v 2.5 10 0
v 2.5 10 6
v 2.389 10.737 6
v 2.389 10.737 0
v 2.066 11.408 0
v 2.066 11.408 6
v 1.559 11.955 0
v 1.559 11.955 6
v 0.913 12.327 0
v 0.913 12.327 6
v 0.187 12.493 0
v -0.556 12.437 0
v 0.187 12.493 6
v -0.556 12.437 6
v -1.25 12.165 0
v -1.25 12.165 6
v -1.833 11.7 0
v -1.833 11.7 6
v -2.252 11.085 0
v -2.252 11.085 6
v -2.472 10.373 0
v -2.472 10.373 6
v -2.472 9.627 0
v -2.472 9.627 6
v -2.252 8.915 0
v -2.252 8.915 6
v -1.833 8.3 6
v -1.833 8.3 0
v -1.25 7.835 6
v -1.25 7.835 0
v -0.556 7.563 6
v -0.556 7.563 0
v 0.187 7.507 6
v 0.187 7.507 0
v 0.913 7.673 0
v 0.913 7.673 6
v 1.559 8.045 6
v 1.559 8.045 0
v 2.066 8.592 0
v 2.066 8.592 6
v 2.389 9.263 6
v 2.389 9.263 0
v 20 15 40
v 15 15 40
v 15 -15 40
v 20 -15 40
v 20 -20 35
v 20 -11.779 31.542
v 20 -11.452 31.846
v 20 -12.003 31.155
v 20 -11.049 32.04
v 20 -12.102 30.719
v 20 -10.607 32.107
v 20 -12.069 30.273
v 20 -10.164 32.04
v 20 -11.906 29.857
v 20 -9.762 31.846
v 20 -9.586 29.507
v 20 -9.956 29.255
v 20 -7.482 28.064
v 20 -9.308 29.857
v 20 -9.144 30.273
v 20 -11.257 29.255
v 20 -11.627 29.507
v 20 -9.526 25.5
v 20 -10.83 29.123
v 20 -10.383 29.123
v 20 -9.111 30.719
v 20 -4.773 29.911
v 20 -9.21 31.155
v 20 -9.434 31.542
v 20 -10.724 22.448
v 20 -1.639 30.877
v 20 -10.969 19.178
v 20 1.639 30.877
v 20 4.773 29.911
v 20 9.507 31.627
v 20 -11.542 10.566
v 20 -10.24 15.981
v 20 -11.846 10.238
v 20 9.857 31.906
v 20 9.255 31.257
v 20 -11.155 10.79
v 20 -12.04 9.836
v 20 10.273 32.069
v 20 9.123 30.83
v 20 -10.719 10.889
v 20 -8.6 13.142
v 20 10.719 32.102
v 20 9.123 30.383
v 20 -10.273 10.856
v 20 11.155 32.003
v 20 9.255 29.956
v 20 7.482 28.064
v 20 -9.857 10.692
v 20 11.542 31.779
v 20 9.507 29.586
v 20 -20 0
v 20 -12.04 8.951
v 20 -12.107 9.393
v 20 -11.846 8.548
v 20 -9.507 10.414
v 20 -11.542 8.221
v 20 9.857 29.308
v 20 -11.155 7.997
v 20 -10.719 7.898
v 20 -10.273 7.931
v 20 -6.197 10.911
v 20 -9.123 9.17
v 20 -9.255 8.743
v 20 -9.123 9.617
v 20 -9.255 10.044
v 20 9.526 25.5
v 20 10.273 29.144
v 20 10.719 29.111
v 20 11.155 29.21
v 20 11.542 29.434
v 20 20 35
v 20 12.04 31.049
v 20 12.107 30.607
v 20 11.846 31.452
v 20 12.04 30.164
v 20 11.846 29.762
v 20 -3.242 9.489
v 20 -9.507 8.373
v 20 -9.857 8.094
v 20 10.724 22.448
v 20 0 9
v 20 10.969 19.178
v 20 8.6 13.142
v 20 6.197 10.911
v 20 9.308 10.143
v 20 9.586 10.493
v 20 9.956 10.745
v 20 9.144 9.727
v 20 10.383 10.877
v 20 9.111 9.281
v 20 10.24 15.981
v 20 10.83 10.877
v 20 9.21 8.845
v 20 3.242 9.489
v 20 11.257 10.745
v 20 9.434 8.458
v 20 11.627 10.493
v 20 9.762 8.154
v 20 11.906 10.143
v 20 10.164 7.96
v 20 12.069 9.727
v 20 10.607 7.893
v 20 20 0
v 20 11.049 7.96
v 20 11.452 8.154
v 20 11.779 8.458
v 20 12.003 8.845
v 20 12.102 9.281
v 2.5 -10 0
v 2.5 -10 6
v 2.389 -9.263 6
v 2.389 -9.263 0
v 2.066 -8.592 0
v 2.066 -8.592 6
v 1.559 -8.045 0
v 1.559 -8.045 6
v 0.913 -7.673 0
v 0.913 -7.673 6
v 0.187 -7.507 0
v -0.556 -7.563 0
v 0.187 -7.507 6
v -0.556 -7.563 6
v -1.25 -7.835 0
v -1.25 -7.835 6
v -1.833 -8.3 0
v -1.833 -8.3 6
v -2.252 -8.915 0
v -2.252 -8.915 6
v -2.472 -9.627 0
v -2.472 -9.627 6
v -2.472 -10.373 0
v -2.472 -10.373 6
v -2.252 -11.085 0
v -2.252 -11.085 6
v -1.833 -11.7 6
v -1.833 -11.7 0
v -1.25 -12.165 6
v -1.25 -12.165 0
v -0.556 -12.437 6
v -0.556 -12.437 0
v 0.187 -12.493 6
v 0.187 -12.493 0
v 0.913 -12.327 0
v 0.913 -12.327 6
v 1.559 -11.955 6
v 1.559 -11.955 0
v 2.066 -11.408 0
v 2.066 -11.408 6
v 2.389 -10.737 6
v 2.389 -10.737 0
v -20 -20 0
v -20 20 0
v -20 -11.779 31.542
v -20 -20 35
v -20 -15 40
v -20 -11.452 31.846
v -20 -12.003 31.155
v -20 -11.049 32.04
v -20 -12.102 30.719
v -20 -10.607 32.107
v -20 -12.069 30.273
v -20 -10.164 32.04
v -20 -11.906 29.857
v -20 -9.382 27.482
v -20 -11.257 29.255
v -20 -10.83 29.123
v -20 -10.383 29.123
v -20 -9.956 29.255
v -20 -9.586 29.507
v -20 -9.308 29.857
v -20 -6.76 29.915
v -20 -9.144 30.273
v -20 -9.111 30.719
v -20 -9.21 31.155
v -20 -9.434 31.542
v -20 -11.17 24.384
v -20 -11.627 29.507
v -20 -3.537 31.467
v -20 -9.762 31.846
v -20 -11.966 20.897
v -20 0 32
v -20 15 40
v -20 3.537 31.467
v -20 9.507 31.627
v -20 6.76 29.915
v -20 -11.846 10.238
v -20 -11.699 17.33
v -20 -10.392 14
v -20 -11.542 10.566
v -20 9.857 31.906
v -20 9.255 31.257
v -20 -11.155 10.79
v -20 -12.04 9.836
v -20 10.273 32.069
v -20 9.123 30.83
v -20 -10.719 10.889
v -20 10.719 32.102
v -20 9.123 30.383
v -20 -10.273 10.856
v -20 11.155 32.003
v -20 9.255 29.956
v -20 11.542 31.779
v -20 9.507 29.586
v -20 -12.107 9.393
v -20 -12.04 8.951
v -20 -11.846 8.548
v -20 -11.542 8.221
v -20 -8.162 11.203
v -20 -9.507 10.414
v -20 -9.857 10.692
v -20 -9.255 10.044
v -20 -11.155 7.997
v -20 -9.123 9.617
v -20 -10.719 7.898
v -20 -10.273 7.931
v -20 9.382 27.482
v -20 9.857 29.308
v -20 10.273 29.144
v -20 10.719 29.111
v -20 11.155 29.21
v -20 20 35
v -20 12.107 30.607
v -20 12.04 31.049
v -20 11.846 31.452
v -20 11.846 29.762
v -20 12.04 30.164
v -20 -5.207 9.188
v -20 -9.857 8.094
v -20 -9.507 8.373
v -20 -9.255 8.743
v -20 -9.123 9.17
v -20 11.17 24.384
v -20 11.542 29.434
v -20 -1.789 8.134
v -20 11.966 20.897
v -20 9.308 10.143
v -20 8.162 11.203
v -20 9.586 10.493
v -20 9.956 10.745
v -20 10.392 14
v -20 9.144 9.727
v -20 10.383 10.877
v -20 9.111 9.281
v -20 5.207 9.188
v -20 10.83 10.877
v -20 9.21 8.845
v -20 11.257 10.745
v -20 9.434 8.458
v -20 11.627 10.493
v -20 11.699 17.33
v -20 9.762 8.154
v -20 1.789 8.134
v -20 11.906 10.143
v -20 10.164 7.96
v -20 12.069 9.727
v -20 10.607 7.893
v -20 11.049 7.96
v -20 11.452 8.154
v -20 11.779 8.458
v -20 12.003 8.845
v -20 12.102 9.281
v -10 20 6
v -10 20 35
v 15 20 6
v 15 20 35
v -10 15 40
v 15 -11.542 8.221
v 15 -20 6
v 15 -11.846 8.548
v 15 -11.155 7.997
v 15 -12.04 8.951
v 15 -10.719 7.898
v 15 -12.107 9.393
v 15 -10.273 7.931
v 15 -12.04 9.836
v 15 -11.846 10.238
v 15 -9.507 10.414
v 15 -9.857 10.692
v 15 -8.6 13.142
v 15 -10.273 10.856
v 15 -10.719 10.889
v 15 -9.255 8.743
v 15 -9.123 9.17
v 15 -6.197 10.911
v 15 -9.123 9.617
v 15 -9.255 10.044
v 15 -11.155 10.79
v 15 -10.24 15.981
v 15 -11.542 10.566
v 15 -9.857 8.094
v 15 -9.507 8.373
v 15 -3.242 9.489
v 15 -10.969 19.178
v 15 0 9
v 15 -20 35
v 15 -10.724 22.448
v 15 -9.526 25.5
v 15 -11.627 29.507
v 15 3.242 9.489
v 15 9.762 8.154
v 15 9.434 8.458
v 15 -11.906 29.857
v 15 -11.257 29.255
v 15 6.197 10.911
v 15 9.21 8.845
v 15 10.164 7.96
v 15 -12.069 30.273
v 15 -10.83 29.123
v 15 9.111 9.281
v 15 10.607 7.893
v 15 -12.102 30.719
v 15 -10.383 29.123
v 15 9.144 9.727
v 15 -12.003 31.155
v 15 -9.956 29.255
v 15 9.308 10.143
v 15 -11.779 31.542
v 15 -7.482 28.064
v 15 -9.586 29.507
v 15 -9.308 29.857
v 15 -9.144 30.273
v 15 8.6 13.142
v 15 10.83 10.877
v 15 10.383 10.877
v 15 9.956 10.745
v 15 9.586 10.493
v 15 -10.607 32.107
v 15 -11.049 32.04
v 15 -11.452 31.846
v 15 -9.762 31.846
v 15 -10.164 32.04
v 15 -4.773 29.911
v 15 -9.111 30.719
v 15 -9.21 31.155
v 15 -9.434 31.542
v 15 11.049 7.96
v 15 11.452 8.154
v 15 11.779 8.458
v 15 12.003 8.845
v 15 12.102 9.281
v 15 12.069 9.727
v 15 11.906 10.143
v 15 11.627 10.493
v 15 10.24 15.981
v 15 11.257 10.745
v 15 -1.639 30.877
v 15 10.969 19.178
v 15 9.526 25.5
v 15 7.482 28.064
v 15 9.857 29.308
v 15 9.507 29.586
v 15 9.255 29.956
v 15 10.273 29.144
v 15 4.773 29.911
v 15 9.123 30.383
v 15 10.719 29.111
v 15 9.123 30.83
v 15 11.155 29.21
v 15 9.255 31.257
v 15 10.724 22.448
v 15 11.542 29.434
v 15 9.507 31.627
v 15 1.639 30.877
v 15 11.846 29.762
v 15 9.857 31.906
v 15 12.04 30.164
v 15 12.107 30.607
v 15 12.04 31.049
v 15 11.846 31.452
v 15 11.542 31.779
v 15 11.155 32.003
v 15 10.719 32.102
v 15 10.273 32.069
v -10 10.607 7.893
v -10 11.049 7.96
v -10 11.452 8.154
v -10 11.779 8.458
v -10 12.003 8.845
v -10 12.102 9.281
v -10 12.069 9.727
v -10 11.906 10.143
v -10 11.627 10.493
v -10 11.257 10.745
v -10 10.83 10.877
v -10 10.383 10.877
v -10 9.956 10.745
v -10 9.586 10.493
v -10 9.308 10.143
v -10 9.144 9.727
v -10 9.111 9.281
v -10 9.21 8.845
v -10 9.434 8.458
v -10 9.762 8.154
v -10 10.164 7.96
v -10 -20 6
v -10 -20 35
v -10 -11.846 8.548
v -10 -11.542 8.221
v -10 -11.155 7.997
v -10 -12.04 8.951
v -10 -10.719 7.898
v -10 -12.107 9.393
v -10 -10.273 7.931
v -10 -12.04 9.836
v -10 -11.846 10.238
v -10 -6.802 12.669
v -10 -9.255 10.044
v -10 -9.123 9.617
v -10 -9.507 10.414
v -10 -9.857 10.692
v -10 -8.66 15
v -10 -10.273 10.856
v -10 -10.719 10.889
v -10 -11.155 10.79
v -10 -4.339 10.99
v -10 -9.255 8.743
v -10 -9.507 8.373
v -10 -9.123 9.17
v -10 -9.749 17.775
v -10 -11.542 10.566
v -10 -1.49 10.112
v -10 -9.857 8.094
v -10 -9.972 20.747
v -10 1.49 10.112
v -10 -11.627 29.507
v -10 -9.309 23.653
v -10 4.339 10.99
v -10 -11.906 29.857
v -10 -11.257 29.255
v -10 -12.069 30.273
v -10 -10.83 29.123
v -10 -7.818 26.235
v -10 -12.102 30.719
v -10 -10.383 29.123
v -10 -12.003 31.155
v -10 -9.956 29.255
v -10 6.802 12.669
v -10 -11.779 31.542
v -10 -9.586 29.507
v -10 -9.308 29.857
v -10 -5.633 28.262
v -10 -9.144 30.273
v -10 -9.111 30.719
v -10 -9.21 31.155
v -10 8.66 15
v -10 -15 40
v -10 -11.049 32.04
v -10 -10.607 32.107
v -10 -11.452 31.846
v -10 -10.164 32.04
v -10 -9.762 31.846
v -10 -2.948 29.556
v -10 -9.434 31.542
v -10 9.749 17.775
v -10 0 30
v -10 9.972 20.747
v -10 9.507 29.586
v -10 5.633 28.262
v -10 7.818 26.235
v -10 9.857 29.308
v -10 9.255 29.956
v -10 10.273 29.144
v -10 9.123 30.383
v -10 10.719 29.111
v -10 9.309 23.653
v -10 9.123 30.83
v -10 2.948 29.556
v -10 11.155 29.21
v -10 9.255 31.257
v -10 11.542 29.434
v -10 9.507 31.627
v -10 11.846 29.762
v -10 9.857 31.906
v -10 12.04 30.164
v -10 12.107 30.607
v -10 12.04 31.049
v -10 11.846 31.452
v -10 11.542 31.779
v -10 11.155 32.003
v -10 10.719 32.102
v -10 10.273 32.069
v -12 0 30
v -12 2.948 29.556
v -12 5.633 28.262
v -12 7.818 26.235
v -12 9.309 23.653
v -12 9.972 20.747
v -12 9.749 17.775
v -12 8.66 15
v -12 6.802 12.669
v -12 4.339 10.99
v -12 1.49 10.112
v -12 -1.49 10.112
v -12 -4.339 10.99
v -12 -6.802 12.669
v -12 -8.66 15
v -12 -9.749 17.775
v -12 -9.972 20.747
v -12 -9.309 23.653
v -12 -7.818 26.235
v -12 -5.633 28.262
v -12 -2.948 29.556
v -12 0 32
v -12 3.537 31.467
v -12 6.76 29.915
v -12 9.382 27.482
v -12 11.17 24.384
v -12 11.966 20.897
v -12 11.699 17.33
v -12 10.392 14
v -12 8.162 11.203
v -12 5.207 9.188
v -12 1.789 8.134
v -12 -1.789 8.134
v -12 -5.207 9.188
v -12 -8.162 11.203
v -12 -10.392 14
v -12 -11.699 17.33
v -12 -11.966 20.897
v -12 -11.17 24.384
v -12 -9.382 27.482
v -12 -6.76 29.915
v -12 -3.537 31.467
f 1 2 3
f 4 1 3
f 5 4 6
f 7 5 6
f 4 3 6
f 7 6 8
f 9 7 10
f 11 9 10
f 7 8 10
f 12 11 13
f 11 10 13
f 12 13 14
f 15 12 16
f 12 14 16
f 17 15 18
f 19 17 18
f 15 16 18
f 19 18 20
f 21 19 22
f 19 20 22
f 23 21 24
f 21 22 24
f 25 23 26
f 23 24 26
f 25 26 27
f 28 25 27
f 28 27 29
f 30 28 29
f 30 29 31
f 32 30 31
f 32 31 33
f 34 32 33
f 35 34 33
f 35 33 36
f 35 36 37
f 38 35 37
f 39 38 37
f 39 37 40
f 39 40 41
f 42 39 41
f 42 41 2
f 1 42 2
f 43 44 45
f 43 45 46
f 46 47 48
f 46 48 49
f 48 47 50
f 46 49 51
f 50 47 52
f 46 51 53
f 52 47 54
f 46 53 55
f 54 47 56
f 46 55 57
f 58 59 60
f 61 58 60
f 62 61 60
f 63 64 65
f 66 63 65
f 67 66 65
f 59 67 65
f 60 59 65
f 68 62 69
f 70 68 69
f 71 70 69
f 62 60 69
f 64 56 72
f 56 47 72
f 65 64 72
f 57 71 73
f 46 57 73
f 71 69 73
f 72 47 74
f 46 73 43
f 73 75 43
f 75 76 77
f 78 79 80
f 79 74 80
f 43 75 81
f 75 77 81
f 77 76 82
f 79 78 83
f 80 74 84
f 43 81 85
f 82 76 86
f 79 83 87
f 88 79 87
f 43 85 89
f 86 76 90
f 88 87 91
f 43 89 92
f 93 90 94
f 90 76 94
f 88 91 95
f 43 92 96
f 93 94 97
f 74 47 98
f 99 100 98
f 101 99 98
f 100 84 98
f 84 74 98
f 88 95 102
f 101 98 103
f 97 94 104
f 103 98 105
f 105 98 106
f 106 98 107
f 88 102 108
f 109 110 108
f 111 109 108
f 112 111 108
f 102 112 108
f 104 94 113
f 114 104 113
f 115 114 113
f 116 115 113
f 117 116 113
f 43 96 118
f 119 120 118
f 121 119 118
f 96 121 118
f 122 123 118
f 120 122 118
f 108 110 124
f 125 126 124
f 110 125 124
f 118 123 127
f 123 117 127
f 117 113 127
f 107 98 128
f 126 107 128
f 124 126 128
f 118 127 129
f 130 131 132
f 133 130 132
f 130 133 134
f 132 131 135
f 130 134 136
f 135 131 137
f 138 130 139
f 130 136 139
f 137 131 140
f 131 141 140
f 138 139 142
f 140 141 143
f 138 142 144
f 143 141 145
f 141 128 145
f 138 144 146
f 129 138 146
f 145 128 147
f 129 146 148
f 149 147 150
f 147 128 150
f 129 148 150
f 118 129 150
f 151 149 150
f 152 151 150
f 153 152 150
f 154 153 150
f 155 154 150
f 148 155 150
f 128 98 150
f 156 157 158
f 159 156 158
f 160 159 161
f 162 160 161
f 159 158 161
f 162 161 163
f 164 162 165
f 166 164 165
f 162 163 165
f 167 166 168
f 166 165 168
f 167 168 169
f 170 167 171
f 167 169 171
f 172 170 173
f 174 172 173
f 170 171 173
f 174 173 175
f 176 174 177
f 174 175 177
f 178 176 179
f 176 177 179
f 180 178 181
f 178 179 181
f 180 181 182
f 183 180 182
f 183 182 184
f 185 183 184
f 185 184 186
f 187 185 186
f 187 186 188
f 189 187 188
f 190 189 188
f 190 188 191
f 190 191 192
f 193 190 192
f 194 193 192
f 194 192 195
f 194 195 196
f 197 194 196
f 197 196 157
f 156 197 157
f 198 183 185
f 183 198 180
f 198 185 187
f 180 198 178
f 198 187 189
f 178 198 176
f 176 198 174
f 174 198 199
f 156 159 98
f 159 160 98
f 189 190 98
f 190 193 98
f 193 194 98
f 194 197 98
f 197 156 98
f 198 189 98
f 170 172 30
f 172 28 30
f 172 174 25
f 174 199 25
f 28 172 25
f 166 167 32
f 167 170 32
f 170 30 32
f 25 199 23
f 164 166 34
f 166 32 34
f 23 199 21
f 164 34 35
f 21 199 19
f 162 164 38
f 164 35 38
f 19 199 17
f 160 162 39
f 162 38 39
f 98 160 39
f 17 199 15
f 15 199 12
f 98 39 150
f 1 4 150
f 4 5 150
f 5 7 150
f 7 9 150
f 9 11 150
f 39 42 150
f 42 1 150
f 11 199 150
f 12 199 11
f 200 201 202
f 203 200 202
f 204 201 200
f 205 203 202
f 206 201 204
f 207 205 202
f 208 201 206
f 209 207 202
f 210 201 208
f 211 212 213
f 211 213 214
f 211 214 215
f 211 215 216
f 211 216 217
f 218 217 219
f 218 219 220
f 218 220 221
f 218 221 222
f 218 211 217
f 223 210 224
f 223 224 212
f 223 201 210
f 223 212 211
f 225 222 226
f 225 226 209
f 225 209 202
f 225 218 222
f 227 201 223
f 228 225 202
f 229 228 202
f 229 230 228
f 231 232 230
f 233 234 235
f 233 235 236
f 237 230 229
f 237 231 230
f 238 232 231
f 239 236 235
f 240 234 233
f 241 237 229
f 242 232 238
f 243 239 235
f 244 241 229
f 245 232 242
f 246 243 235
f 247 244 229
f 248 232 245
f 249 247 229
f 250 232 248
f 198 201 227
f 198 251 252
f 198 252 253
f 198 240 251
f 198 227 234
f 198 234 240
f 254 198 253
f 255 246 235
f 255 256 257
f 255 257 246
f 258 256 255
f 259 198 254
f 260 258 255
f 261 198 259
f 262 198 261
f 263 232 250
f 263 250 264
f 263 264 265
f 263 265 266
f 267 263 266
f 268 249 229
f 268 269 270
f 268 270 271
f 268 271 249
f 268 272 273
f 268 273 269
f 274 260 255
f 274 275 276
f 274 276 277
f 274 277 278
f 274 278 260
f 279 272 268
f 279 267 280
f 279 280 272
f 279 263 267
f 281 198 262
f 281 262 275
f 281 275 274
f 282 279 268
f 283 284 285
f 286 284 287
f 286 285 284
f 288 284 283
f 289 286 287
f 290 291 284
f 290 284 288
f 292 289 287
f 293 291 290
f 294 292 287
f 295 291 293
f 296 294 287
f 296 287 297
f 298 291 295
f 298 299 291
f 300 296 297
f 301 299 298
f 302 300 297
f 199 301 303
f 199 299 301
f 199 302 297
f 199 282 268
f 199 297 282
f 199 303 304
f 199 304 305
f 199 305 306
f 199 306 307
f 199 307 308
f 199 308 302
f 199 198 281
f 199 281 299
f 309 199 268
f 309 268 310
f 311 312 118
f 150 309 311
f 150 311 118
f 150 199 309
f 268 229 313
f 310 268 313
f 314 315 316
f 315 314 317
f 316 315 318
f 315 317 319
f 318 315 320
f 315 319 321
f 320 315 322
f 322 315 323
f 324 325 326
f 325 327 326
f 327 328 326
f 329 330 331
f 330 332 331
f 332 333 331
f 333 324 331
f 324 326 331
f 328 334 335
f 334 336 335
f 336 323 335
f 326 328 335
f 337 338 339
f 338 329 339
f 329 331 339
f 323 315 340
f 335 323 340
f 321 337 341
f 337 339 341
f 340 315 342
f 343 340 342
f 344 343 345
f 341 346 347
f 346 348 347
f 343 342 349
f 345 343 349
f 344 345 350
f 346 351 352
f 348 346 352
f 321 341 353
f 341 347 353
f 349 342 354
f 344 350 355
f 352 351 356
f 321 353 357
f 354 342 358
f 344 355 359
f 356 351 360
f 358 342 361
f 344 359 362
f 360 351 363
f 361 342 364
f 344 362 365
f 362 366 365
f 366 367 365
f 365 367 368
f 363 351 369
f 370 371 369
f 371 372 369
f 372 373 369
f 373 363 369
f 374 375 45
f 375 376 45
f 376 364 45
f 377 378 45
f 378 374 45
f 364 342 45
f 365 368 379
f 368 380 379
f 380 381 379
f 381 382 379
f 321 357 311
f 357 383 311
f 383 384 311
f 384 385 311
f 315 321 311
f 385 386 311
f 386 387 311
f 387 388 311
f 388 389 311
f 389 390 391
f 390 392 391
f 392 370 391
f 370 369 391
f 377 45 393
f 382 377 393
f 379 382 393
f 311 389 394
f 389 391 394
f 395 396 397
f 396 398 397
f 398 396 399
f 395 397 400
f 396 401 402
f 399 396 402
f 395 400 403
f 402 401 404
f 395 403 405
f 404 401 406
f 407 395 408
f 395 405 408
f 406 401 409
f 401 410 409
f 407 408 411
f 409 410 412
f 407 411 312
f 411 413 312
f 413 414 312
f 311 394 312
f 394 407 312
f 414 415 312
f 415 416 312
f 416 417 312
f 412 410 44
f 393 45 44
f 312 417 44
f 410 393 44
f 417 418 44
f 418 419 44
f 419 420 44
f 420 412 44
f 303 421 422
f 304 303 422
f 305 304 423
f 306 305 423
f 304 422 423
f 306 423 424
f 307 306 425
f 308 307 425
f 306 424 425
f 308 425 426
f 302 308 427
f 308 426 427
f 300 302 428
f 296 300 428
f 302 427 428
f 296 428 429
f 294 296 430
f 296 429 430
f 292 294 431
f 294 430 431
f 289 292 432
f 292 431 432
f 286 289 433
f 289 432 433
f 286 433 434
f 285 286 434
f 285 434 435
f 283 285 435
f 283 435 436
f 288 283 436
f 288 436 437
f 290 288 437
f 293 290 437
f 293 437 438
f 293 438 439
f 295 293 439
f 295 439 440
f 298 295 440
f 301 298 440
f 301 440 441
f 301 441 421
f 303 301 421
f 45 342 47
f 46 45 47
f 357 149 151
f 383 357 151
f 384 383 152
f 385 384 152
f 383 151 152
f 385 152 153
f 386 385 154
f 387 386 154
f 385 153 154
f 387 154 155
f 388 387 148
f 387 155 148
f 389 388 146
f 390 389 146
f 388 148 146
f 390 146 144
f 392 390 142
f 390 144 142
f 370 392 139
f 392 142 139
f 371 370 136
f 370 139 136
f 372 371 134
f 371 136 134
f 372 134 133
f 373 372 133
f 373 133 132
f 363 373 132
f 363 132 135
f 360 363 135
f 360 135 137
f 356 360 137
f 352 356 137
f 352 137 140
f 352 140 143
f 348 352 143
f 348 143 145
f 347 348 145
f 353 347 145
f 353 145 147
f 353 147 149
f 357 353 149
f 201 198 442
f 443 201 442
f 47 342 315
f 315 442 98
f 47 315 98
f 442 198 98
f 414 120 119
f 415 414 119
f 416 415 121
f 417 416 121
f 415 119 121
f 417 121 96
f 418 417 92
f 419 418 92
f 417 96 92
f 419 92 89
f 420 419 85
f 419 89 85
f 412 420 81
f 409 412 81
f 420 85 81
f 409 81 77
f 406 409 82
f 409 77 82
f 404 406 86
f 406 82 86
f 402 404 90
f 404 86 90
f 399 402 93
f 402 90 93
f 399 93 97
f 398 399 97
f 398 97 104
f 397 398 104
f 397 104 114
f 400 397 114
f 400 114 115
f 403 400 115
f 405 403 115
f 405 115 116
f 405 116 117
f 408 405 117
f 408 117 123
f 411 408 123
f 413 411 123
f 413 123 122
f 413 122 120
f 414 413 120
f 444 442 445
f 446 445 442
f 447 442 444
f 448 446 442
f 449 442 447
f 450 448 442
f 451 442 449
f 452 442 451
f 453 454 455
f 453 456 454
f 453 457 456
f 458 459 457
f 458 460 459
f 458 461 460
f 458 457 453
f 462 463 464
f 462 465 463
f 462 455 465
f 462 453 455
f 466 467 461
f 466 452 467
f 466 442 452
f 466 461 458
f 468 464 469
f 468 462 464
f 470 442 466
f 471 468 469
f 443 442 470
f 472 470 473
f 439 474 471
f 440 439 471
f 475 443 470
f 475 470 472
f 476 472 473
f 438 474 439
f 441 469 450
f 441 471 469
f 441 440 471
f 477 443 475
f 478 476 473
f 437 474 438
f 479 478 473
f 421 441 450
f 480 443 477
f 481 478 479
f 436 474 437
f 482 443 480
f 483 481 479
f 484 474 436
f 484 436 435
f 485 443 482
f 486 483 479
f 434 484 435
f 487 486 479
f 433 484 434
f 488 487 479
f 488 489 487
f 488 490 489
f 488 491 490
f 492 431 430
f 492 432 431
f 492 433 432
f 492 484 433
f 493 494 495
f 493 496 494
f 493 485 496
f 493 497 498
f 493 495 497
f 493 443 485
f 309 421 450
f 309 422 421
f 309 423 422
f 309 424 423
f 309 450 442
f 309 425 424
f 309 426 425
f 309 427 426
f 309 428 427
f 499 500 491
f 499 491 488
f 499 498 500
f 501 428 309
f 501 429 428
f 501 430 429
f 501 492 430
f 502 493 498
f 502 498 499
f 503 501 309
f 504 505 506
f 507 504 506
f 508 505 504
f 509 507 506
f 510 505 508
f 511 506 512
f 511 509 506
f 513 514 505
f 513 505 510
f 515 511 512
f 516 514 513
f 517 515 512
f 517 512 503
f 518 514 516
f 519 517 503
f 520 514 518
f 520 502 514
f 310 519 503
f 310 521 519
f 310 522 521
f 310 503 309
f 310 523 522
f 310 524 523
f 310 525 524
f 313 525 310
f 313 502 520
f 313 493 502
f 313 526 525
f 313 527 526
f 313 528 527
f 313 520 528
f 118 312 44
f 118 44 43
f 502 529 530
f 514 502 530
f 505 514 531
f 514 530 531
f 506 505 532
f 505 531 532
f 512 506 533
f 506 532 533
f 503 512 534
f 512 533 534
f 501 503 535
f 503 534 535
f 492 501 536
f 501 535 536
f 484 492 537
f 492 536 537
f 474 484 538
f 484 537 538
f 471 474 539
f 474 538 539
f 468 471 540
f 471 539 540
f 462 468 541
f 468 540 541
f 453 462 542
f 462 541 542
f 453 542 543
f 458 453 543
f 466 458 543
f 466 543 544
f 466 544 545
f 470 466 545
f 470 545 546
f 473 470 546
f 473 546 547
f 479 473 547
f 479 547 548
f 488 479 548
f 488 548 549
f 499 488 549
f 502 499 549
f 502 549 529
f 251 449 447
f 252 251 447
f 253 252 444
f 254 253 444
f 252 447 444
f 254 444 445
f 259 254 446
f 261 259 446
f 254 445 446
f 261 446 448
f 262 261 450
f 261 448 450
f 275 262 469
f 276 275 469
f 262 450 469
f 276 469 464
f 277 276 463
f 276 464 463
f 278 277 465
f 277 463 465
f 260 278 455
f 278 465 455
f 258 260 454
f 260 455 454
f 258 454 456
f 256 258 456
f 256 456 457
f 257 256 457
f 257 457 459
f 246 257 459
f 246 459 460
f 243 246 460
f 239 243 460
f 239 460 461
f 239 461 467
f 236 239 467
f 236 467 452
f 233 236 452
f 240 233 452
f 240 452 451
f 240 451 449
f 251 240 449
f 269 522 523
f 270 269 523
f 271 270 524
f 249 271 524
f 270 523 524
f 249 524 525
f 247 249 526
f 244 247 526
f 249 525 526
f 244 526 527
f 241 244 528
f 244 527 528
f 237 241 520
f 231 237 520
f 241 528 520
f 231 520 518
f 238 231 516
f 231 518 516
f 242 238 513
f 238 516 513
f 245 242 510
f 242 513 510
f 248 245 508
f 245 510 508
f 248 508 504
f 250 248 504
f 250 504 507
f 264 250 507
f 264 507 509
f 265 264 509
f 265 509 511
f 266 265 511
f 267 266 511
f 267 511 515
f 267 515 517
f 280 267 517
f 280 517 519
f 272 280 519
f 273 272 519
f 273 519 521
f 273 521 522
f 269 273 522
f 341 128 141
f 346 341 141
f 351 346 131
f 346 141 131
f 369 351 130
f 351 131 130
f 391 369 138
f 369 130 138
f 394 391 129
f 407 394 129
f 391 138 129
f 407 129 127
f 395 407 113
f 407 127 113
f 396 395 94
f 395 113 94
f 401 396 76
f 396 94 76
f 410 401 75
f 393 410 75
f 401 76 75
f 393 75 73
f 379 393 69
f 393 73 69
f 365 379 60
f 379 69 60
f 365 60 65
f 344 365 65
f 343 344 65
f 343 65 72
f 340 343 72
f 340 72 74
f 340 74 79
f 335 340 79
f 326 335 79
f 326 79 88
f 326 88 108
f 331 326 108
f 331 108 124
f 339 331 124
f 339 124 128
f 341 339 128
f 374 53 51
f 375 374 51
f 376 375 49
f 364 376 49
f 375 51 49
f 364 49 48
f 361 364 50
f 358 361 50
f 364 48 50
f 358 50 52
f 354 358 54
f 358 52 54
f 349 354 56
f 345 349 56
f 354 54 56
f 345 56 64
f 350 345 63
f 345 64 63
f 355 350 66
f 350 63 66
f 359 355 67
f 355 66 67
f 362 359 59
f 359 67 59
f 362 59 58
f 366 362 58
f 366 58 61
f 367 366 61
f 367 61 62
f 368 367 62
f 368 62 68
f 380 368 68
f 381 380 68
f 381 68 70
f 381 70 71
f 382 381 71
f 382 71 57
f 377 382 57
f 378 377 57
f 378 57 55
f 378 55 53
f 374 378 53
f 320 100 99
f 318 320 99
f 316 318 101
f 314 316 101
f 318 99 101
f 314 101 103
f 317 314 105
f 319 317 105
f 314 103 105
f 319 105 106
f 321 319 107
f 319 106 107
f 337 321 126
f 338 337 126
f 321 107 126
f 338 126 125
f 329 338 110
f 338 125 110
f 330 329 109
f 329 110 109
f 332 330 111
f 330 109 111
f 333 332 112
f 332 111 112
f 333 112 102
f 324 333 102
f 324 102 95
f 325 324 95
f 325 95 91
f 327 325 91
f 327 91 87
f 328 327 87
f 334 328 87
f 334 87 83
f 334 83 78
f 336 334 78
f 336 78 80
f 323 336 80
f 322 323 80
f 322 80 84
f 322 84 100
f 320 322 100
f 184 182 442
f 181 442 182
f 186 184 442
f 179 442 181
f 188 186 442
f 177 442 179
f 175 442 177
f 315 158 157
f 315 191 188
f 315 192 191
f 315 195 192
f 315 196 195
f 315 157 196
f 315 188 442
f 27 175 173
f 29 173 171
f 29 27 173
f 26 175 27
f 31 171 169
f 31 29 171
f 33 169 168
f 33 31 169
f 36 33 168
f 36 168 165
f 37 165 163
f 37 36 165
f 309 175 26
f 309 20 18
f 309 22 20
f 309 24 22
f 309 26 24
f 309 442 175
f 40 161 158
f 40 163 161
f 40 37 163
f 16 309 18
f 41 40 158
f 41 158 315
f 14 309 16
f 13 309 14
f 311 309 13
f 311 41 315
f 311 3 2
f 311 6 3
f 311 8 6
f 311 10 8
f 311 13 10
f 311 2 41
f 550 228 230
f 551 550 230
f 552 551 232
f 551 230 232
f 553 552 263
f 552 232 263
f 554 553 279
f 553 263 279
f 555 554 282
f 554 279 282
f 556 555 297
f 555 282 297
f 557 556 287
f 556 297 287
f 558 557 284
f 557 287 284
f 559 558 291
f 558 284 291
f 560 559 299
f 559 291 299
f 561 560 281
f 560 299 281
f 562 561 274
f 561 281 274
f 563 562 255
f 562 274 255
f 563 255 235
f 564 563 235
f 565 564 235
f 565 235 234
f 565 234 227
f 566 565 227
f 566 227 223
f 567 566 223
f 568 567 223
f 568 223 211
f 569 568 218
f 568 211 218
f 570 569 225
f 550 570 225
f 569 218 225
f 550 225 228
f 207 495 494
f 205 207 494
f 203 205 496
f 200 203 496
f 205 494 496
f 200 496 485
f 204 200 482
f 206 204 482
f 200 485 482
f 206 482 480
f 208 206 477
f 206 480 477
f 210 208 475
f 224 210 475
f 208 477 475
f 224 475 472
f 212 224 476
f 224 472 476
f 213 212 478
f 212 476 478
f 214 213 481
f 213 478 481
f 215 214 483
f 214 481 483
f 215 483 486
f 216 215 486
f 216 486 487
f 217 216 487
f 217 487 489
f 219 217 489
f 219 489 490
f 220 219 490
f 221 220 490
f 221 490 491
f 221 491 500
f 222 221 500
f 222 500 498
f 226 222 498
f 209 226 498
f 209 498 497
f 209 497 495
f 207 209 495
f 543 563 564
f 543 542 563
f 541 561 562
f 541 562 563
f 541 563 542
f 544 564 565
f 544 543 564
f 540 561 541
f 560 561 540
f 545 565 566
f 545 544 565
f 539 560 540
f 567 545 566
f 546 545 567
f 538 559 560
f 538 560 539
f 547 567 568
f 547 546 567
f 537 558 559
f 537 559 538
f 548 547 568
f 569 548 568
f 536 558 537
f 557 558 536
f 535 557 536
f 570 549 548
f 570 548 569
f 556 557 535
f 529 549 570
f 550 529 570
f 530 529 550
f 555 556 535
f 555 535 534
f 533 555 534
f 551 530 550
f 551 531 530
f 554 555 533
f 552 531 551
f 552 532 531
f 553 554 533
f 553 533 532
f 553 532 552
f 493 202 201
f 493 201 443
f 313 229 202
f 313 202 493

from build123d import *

# Parameters (mm, degrees)
SKETCH_1_W               = 40
SKETCH_1_H               = 40
EXTRUDE_1_DEPTH          = 40
SKETCH_2_W               = 25
SKETCH_2_H               = 40
CUT_EXTRUDE_1_DEPTH      = 34
SKETCH_3_R               = 2.5
CUT_EXTRUDE_2_DEPTH      = 7
CHAMFER_1_SIZE           = 5
SKETCH_5_R               = 12
CUT_EXTRUDE_4_DEPTH      = 8
CUT_EXTRUDE_5_REACH      = 34
SKETCH_7_R               = 10
CUT_EXTRUDE_6_REACH      = 42
SKETCH_4_R               = 11
SKETCH_9_R               = 1.5
CUT_EXTRUDE_7_DEPTH      = 41
PATTERN_CIRCULAR_1_COUNT = 4


with BuildPart() as part:
    # 草圖1 → 填料-伸長1 (new body)
    with BuildSketch(Plane.XY):
        Rectangle(SKETCH_1_W, SKETCH_1_H)
    extrude(amount=EXTRUDE_1_DEPTH)

    # 草圖2 → 除料-伸長1 (cut)
    with BuildSketch(Plane.XY.offset(40)):
        with Locations((2.5, 0)):
            Rectangle(SKETCH_2_W, SKETCH_2_H)
    extrude(amount=-CUT_EXTRUDE_1_DEPTH, mode=Mode.SUBTRACT)

    # 草圖3 → 除料-伸長2 (cut, through all)
    with BuildSketch(Plane.XY.offset(6)):
        with Locations((0, 10)):
            Circle(SKETCH_3_R)
        with Locations((0, -10)):
            Circle(SKETCH_3_R)
    extrude(amount=-CUT_EXTRUDE_2_DEPTH, mode=Mode.SUBTRACT)

    # 導角1
    chamfer_1_edges = [part.edges().sort_by_distance(p)[0] for p in [
        (-15, -20, 40),
        (-15, 20, 40),
        (17.5, -20, 40),
        (17.5, 20, 40),
    ]]
    chamfer(chamfer_1_edges, length=CHAMFER_1_SIZE)

    # 草圖5 → 除料-伸長4 (cut)
    with BuildSketch(Plane.ZY.offset(20)):
        with Locations((20, 0)):
            Circle(SKETCH_5_R)
    extrude(amount=-CUT_EXTRUDE_4_DEPTH, mode=Mode.SUBTRACT)

    # 草圖7 → 除料-伸長5 (cut, up to next)
    with BuildSketch(Plane.ZY.offset(12), mode=Mode.PRIVATE) as cut_extrude_5_sk1:
        with Locations((20, 0)):
            Circle(SKETCH_7_R)
    cut_extrude_5_tool1 = extrude(cut_extrude_5_sk1.sketch, amount=-CUT_EXTRUDE_5_REACH, mode=Mode.PRIVATE) & part.part
    add(cut_extrude_5_tool1.solids().sort_by_distance((-12, 0, 20))[0], mode=Mode.SUBTRACT)

    # 草圖4 → 除料-伸長6 (cut, up to next)
    with BuildSketch(Plane(origin=(20, 0, 0), x_dir=(0, 0, -1), z_dir=(1, 0, 0)), mode=Mode.PRIVATE) as cut_extrude_6_sk1:
        with Locations((-20, 0)):
            Circle(SKETCH_4_R)
    cut_extrude_6_tool1 = extrude(cut_extrude_6_sk1.sketch, amount=-CUT_EXTRUDE_6_REACH, mode=Mode.PRIVATE) & part.part
    add(cut_extrude_6_tool1.solids().sort_by_distance((20, 0, 20))[0], mode=Mode.SUBTRACT)

    # 草圖9 → 除料-伸長7 (cut, through all)
    with BuildSketch(Plane(origin=(20, 0, 0), x_dir=(0, 0, -1), z_dir=(1, 0, 0))):
        with Locations((-9.393398282, 10.606601718)):
            Circle(SKETCH_9_R)
    cut_extrude_7 = extrude(amount=-CUT_EXTRUDE_7_DEPTH, mode=Mode.SUBTRACT)

    # 環狀複製排列1: 除料-伸長7 ×4 about axis
    pattern_circular_1_axis = Axis((0, 0, 20), (1, 0, 0))
    for i in range(1, PATTERN_CIRCULAR_1_COUNT):
        add(cut_extrude_7.rotate(pattern_circular_1_axis, i * 360 / PATTERN_CIRCULAR_1_COUNT), mode=Mode.SUBTRACT)


solid = part.part
